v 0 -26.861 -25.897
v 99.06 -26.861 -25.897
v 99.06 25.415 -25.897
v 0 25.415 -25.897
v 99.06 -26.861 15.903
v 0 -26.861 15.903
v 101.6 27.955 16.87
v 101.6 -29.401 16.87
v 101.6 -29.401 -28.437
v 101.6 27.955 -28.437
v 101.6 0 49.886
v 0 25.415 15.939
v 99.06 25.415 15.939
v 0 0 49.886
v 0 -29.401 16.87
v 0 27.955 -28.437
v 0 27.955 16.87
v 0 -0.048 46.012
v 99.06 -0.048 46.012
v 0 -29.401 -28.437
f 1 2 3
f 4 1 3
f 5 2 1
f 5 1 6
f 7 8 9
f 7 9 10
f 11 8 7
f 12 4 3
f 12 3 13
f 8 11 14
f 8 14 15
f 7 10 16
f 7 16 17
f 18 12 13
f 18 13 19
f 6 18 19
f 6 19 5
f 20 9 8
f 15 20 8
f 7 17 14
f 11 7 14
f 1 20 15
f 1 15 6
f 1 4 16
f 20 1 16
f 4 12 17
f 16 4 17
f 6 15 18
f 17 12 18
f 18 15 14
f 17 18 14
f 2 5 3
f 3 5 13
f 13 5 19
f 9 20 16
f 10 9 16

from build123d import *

# Parameters (mm, degrees)
F0_W     = 57.356569916
F0_H     = 45.3068669885
F1_DEPTH = 101.6
F2_T     = -2.54


with BuildPart() as f1:
    # F0 (on Right) → F1 (new body)
    with BuildSketch(Plane.YZ):
        with Locations((-0.7229857147, -5.7838549837)):
            Rectangle(F0_W, F0_H)
        Polygon((0, 49.8857535422), (-29.4012706727, 16.8695785105), (27.9552992433, 16.8695785105), align=None)
    extrude(amount=F1_DEPTH)

    # F2
    f2_openings = [f1.faces().sort_by_distance(p)[0] for p in [
        (0, -0.658626, 3.204954),
    ]]
    offset(amount=F2_T, openings=f2_openings)


solid = f1.part
